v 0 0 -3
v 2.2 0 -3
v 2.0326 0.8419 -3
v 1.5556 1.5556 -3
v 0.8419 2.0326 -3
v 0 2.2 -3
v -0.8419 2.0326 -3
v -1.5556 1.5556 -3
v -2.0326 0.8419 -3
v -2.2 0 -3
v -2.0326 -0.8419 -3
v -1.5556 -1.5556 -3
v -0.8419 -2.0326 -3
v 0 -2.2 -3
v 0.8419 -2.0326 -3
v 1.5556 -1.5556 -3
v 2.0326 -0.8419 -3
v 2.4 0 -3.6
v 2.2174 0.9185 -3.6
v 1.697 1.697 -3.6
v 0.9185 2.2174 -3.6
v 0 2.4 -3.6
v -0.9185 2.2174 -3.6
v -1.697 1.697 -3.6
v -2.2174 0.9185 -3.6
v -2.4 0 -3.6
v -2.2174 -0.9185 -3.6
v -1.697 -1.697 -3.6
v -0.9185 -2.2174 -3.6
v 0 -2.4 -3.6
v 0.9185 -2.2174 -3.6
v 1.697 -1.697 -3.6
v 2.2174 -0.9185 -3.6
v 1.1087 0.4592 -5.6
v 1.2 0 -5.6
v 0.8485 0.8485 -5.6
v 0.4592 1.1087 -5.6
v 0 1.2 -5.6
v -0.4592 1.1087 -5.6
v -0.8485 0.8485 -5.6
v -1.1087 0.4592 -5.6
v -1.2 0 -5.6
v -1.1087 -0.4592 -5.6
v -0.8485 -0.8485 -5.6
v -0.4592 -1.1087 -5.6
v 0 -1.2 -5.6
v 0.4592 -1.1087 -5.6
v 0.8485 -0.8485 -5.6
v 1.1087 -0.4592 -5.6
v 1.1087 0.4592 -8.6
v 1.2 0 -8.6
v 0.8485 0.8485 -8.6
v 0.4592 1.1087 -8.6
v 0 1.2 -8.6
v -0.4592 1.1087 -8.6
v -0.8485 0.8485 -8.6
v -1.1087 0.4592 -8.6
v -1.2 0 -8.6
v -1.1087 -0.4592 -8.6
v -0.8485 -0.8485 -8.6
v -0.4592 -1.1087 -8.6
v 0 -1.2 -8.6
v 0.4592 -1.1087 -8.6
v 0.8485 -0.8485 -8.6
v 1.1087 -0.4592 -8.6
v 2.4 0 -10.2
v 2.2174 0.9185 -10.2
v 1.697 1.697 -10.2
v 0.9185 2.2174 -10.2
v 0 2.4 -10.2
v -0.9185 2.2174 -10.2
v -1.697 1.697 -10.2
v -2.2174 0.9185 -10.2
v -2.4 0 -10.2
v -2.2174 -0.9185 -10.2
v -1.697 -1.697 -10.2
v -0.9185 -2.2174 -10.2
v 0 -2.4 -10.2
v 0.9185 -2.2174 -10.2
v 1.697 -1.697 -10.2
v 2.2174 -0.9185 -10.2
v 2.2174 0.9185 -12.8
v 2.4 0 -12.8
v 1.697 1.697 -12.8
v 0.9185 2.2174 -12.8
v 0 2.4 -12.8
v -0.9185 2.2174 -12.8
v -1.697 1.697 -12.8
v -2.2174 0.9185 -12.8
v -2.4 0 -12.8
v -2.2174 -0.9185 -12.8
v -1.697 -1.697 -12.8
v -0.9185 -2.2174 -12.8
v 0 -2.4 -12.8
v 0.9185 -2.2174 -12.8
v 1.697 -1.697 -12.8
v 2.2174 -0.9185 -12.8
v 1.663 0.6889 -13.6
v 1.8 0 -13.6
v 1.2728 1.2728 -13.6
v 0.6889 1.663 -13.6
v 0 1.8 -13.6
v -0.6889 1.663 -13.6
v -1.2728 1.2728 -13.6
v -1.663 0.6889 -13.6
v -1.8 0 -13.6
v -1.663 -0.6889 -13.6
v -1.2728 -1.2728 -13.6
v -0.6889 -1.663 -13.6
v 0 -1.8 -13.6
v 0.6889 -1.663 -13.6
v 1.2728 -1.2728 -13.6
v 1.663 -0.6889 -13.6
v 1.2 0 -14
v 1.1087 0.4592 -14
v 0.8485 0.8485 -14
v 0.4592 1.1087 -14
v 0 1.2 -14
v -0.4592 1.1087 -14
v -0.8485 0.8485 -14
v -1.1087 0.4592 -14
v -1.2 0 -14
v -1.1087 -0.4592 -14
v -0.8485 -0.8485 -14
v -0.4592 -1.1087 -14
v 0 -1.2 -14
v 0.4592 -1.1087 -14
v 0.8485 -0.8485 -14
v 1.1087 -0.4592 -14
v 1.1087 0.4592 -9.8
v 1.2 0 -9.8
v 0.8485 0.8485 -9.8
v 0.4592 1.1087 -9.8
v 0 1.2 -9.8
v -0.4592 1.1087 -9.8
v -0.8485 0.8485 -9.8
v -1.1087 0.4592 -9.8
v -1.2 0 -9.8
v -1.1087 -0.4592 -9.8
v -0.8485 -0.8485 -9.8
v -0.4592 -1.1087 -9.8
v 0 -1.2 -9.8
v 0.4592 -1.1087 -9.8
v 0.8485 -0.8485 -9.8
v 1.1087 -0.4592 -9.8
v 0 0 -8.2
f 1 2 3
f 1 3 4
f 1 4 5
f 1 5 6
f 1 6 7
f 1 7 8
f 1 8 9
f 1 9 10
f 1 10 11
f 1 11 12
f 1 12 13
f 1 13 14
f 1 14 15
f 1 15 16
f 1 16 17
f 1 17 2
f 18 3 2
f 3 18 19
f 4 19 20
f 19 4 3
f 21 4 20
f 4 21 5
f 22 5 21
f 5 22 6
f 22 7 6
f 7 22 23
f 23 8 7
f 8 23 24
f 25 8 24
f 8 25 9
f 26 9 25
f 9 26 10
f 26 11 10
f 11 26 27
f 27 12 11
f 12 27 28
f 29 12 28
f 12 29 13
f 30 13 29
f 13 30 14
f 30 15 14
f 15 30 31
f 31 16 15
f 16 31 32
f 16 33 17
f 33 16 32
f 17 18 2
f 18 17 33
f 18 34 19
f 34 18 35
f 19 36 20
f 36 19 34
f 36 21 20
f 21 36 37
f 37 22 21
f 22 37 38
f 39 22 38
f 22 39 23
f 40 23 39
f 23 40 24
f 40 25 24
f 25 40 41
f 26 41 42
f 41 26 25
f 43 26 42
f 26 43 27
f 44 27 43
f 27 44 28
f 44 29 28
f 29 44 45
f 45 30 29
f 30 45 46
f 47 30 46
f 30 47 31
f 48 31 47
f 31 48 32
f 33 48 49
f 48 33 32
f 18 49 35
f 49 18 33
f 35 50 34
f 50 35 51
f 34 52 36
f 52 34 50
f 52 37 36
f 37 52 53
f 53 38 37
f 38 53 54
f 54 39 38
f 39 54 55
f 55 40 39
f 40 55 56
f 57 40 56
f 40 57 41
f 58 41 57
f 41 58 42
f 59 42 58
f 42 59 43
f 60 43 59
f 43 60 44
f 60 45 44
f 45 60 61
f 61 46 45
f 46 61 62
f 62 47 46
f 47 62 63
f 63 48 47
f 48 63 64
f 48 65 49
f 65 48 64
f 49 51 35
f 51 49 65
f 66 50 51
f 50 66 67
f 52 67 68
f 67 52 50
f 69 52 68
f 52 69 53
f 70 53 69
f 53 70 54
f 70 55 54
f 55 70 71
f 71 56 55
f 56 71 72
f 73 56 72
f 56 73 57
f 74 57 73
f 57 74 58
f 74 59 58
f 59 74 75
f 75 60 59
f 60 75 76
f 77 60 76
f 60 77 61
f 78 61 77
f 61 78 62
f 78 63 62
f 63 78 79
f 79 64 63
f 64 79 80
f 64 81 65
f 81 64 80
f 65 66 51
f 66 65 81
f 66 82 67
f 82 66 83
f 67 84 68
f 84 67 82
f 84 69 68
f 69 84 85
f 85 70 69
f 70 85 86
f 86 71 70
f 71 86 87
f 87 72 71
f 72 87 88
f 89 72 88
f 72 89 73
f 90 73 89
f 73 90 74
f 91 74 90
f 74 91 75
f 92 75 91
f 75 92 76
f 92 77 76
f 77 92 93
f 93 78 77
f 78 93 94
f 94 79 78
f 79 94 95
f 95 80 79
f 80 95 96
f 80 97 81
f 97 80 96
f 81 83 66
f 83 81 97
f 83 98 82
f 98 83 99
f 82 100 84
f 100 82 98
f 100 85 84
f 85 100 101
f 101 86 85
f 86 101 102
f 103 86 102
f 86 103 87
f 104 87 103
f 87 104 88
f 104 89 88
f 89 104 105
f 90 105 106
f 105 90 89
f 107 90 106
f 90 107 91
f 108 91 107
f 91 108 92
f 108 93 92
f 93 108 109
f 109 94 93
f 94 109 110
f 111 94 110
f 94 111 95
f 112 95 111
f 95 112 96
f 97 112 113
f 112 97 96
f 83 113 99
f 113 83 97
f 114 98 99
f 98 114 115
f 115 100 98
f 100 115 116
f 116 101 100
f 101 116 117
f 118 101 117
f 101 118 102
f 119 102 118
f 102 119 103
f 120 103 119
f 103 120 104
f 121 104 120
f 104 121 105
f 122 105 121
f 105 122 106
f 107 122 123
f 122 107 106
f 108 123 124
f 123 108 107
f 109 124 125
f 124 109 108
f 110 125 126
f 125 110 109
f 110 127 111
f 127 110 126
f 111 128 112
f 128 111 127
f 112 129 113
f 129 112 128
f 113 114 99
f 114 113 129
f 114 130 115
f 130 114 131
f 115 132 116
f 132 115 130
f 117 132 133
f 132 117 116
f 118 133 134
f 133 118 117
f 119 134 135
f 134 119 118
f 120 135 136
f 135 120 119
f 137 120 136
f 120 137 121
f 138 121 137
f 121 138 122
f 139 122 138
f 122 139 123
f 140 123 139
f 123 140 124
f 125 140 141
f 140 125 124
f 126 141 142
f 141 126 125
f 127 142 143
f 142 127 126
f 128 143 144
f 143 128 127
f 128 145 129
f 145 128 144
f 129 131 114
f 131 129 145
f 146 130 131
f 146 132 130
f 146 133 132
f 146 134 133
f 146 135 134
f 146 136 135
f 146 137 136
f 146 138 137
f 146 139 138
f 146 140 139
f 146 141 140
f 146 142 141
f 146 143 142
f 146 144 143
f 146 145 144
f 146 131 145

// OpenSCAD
// file: ../../p/4-4cyli.scad
use <../lib.scad>
$fa=1; $fs=0.2;
function ldraw_lib__4_4cyli(realsolid=false) = [
// 0 Cylinder 1.0
// 0 Name: 4-4cyli.dat
// 0 Author: James Jessiman
// 0 !LDRAW_ORG Primitive UPDATE 2005-01
// 0 !LICENSE Licensed under CC BY 2.0 and CC BY 4.0 : see CAreadme.txt
// 
// 0 BFC CERTIFY CCW
  [0,"BFC","CERTIFY"],
  [0,"BFC","CCW"],
// 
// 0 !HISTORY 1998-12-15 [PTadmin] Official Update 1998-10
// 0 !HISTORY 2002-03-23 [sbliss] Added BFC statement; merged headers from files in distributions LDraw 0.27 and Complete.
// 0 !HISTORY 2002-04-25 [PTadmin] Official Update 2002-02
// 0 !HISTORY 2004-12-14 [guyvivan] BFC CCW
// 0 !HISTORY 2005-12-28 [PTadmin] Official Update 2005-01
// 0 !HISTORY 2007-06-24 [PTadmin] Header formatted for Contributor Agreement
// 0 !HISTORY 2008-07-01 [PTadmin] Official Update 2008-01
// 
// 
// 4 16 1 1 0 0.9239 1 0.3827 0.9239 0 0.3827 1 0 0
  [4,16,1,1,0,0.9239,1,0.3827,0.9239,0,0.3827,1,0,0],
// 5 24 1 0 0 1 1 0 0.9239 0 0.3827 0.9239 0 -0.3827
  [5,24,1,0,0,1,1,0,0.9239,0,0.3827,0.9239,0,-0.3827],
// 4 16 0.9239 1 0.3827 0.7071 1 0.7071 0.7071 0 0.7071 0.9239 0 0.3827
  [4,16,0.9239,1,0.3827,0.7071,1,0.7071,0.7071,0,0.7071,0.9239,0,0.3827],
// 5 24 0.9239 0 0.3827 0.9239 1 0.3827 0.7071 0 0.7071 1 0 0
  [5,24,0.9239,0,0.3827,0.9239,1,0.3827,0.7071,0,0.7071,1,0,0],
// 4 16 0.7071 1 0.7071 0.3827 1 0.9239 0.3827 0 0.9239 0.7071 0 0.7071
  [4,16,0.7071,1,0.7071,0.3827,1,0.9239,0.3827,0,0.9239,0.7071,0,0.7071],
// 5 24 0.7071 0 0.7071 0.7071 1 0.7071 0.3827 0 0.9239 0.9239 0 0.3827
  [5,24,0.7071,0,0.7071,0.7071,1,0.7071,0.3827,0,0.9239,0.9239,0,0.3827],
// 4 16 0.3827 1 0.9239 0 1 1 0 0 1 0.3827 0 0.9239
  [4,16,0.3827,1,0.9239,0,1,1,0,0,1,0.3827,0,0.9239],
// 5 24 0.3827 0 0.9239 0.3827 1 0.9239 0 0 1 0.7071 0 0.7071
  [5,24,0.3827,0,0.9239,0.3827,1,0.9239,0,0,1,0.7071,0,0.7071],
// 4 16 0 1 1 -0.3827 1 0.9239 -0.3827 0 0.9239 0 0 1
  [4,16,0,1,1,-0.3827,1,0.9239,-0.3827,0,0.9239,0,0,1],
// 5 24 0 0 1 0 1 1 -0.3827 0 0.9239 0.3827 0 0.9239
  [5,24,0,0,1,0,1,1,-0.3827,0,0.9239,0.3827,0,0.9239],
// 4 16 -0.3827 1 0.9239 -0.7071 1 0.7071 -0.7071 0 0.7071 -0.3827 0 0.9239
  [4,16,-0.3827,1,0.9239,-0.7071,1,0.7071,-0.7071,0,0.7071,-0.3827,0,0.9239],
// 5 24 -0.3827 0 0.9239 -0.3827 1 0.9239 -0.7071 0 0.7071 0 0 1
  [5,24,-0.3827,0,0.9239,-0.3827,1,0.9239,-0.7071,0,0.7071,0,0,1],
// 4 16 -0.7071 1 0.7071 -0.9239 1 0.3827 -0.9239 0 0.3827 -0.7071 0 0.7071
  [4,16,-0.7071,1,0.7071,-0.9239,1,0.3827,-0.9239,0,0.3827,-0.7071,0,0.7071],
// 5 24 -0.7071 0 0.7071 -0.7071 1 0.7071 -0.9239 0 0.3827 -0.3827 0 0.9239
  [5,24,-0.7071,0,0.7071,-0.7071,1,0.7071,-0.9239,0,0.3827,-0.3827,0,0.9239],
// 4 16 -0.9239 1 0.3827 -1 1 0 -1 0 0 -0.9239 0 0.3827
  [4,16,-0.9239,1,0.3827,-1,1,0,-1,0,0,-0.9239,0,0.3827],
// 5 24 -0.9239 0 0.3827 -0.9239 1 0.3827 -1 0 0 -0.7071 0 0.7071
  [5,24,-0.9239,0,0.3827,-0.9239,1,0.3827,-1,0,0,-0.7071,0,0.7071],
// 4 16 -1 1 0 -0.9239 1 -0.3827 -0.9239 0 -0.3827 -1 0 0
  [4,16,-1,1,0,-0.9239,1,-0.3827,-0.9239,0,-0.3827,-1,0,0],
// 5 24 -1 0 0 -1 1 0 -0.9239 0 -0.3827 -0.9239 0 0.3827
  [5,24,-1,0,0,-1,1,0,-0.9239,0,-0.3827,-0.9239,0,0.3827],
// 4 16 -0.9239 1 -0.3827 -0.7071 1 -0.7071 -0.7071 0 -0.7071 -0.9239 0 -0.3827
  [4,16,-0.9239,1,-0.3827,-0.7071,1,-0.7071,-0.7071,0,-0.7071,-0.9239,0,-0.3827],
// 5 24 -0.9239 0 -0.3827 -0.9239 1 -0.3827 -0.7071 0 -0.7071 -1 0 0
  [5,24,-0.9239,0,-0.3827,-0.9239,1,-0.3827,-0.7071,0,-0.7071,-1,0,0],
// 4 16 -0.7071 1 -0.7071 -0.3827 1 -0.9239 -0.3827 0 -0.9239 -0.7071 0 -0.7071
  [4,16,-0.7071,1,-0.7071,-0.3827,1,-0.9239,-0.3827,0,-0.9239,-0.7071,0,-0.7071],
// 5 24 -0.7071 0 -0.7071 -0.7071 1 -0.7071 -0.3827 0 -0.9239 -0.9239 0 -0.3827
  [5,24,-0.7071,0,-0.7071,-0.7071,1,-0.7071,-0.3827,0,-0.9239,-0.9239,0,-0.3827],
// 4 16 -0.3827 1 -0.9239 0 1 -1 0 0 -1 -0.3827 0 -0.9239
  [4,16,-0.3827,1,-0.9239,0,1,-1,0,0,-1,-0.3827,0,-0.9239],
// 5 24 -0.3827 0 -0.9239 -0.3827 1 -0.9239 0 0 -1 -0.7071 0 -0.7071
  [5,24,-0.3827,0,-0.9239,-0.3827,1,-0.9239,0,0,-1,-0.7071,0,-0.7071],
// 4 16 0 1 -1 0.3827 1 -0.9239 0.3827 0 -0.9239 0 0 -1
  [4,16,0,1,-1,0.3827,1,-0.9239,0.3827,0,-0.9239,0,0,-1],
// 5 24 0 0 -1 0 1 -1 0.3827 0 -0.9239 -0.3827 0 -0.9239
  [5,24,0,0,-1,0,1,-1,0.3827,0,-0.9239,-0.3827,0,-0.9239],
// 4 16 0.3827 1 -0.9239 0.7071 1 -0.7071 0.7071 0 -0.7071 0.3827 0 -0.9239
  [4,16,0.3827,1,-0.9239,0.7071,1,-0.7071,0.7071,0,-0.7071,0.3827,0,-0.9239],
// 5 24 0.3827 0 -0.9239 0.3827 1 -0.9239 0.7071 0 -0.7071 0 0 -1
  [5,24,0.3827,0,-0.9239,0.3827,1,-0.9239,0.7071,0,-0.7071,0,0,-1],
// 4 16 0.7071 1 -0.7071 0.9239 1 -0.3827 0.9239 0 -0.3827 0.7071 0 -0.7071
  [4,16,0.7071,1,-0.7071,0.9239,1,-0.3827,0.9239,0,-0.3827,0.7071,0,-0.7071],
// 5 24 0.7071 0 -0.7071 0.7071 1 -0.7071 0.9239 0 -0.3827 0.3827 0 -0.9239
  [5,24,0.7071,0,-0.7071,0.7071,1,-0.7071,0.9239,0,-0.3827,0.3827,0,-0.9239],
// 4 16 0.9239 1 -0.3827 1 1 0 1 0 0 0.9239 0 -0.3827
  [4,16,0.9239,1,-0.3827,1,1,0,1,0,0,0.9239,0,-0.3827],
// 5 24 0.9239 0 -0.3827 0.9239 1 -0.3827 1 0 0 0.7071 0 -0.7071
  [5,24,0.9239,0,-0.3827,0.9239,1,-0.3827,1,0,0,0.7071,0,-0.7071],
// 0
];
module ldraw_lib__4_4cyli(step=0, col=false, unit=2/5, alt=false, line=0.2, solid=!$preview)
    makepoly(ldraw_lib__4_4cyli(solid), step=step, col=col, unit=unit, alt=alt, line=line, solid=solid);
ldraw_lib__4_4cyli(line=0.2);
// file: ../../p/4-4edge.scad
use <../lib.scad>
function ldraw_lib__4_4edge() = [
// 0 Circle 1.0
// 0 Name: 4-4edge.dat
// 0 Author: James Jessiman
// 0 !LDRAW_ORG Primitive UPDATE 2017-01
// 0 !LICENSE Licensed under CC BY 2.0 and CC BY 4.0 : see CAreadme.txt
// 
// 0 BFC CERTIFY CCW
  [0,"BFC","CERTIFY"],
  [0,"BFC","CCW"],
// 
// 0 !HISTORY 1998-12-15 [PTadmin] Official Update 1998-10
// 0 !HISTORY 2005-12-28 [PTadmin] Official Update 2005-01
// 0 !HISTORY 2007-06-24 [PTadmin] Header formatted for Contributor Agreement
// 0 !HISTORY 2008-07-01 [PTadmin] Official Update 2008-01
// 0 !HISTORY 2017-01-15 [Steffen] BFCed
// 0 !HISTORY 2017-12-30 [PTadmin] Official Update 2017-01
// 
// 
// 2 24 1 0 0 0.9239 0 0.3827
  [2,24,1,0,0,0.9239,0,0.3827],
// 2 24 0.9239 0 0.3827 0.7071 0 0.7071
  [2,24,0.9239,0,0.3827,0.7071,0,0.7071],
// 2 24 0.7071 0 0.7071 0.3827 0 0.9239
  [2,24,0.7071,0,0.7071,0.3827,0,0.9239],
// 2 24 0.3827 0 0.9239 0 0 1
  [2,24,0.3827,0,0.9239,0,0,1],
// 2 24 0 0 1 -0.3827 0 0.9239
  [2,24,0,0,1,-0.3827,0,0.9239],
// 2 24 -0.3827 0 0.9239 -0.7071 0 0.7071
  [2,24,-0.3827,0,0.9239,-0.7071,0,0.7071],
// 2 24 -0.7071 0 0.7071 -0.9239 0 0.3827
  [2,24,-0.7071,0,0.7071,-0.9239,0,0.3827],
// 2 24 -0.9239 0 0.3827 -1 0 -0
  [2,24,-0.9239,0,0.3827,-1,0,-0],
// 2 24 -1 0 -0 -0.9239 0 -0.3827
  [2,24,-1,0,-0,-0.9239,0,-0.3827],
// 2 24 -0.9239 0 -0.3827 -0.7071 0 -0.7071
  [2,24,-0.9239,0,-0.3827,-0.7071,0,-0.7071],
// 2 24 -0.7071 0 -0.7071 -0.3827 0 -0.9239
  [2,24,-0.7071,0,-0.7071,-0.3827,0,-0.9239],
// 2 24 -0.3827 0 -0.9239 0 0 -1
  [2,24,-0.3827,0,-0.9239,0,0,-1],
// 2 24 0 0 -1 0.3827 0 -0.9239
  [2,24,0,0,-1,0.3827,0,-0.9239],
// 2 24 0.3827 0 -0.9239 0.7071 0 -0.7071
  [2,24,0.3827,0,-0.9239,0.7071,0,-0.7071],
// 2 24 0.7071 0 -0.7071 0.9239 0 -0.3827
  [2,24,0.7071,0,-0.7071,0.9239,0,-0.3827],
// 2 24 0.9239 0 -0.3827 1 0 0
  [2,24,0.9239,0,-0.3827,1,0,0],
];
module ldraw_lib__4_4edge(step=0, col=false, unit=2/5, alt=false, line=0.2, solid=!$preview)
    makepoly(ldraw_lib__4_4edge(), step=step, col=col, unit=unit, alt=alt, line=line, solid=solid);
ldraw_lib__4_4edge(line=0.2);
// file: ../../p/4-4disc.scad
use <../lib.scad>
function ldraw_lib__4_4disc() = [
// 0 Disc 1.0
// 0 Name: 4-4disc.dat
// 0 Author: James Jessiman
// 0 !LDRAW_ORG Primitive UPDATE 2002-02
// 0 !LICENSE Licensed under CC BY 2.0 and CC BY 4.0 : see CAreadme.txt
// 
// 0 BFC CERTIFY CCW
  [0,"BFC","CERTIFY"],
  [0,"BFC","CCW"],
// 
// 0 !HISTORY 1998-12-15 [PTadmin] Official Update 1998-10
// 0 !HISTORY 2002-03-23 [sbliss] Added BFC statement
// 0 !HISTORY 2002-04-25 [PTadmin] Official Update 2002-02
// 0 !HISTORY 2007-06-24 [PTadmin] Header formatted for Contributor Agreement
// 0 !HISTORY 2008-07-01 [PTadmin] Official Update 2008-01
// 
// 
// 3 16 0 0 0 1 0 0 0.9239 0 0.3827
  [3,16,0,0,0,1,0,0,0.9239,0,0.3827],
// 3 16 0 0 0 0.9239 0 0.3827 0.7071 0 0.7071
  [3,16,0,0,0,0.9239,0,0.3827,0.7071,0,0.7071],
// 3 16 0 0 0 0.7071 0 0.7071 0.3827 0 0.9239
  [3,16,0,0,0,0.7071,0,0.7071,0.3827,0,0.9239],
// 3 16 0 0 0 0.3827 0 0.9239 0 0 1
  [3,16,0,0,0,0.3827,0,0.9239,0,0,1],
// 3 16 0 0 0 0 0 1 -0.3827 0 0.9239
  [3,16,0,0,0,0,0,1,-0.3827,0,0.9239],
// 3 16 0 0 0 -0.3827 0 0.9239 -0.7071 0 0.7071
  [3,16,0,0,0,-0.3827,0,0.9239,-0.7071,0,0.7071],
// 3 16 0 0 0 -0.7071 0 0.7071 -0.9239 0 0.3827
  [3,16,0,0,0,-0.7071,0,0.7071,-0.9239,0,0.3827],
// 3 16 0 0 0 -0.9239 0 0.3827 -1 0 -0
  [3,16,0,0,0,-0.9239,0,0.3827,-1,0,-0],
// 3 16 0 0 0 -1 0 -0 -0.9239 0 -0.3827
  [3,16,0,0,0,-1,0,-0,-0.9239,0,-0.3827],
// 3 16 0 0 0 -0.9239 0 -0.3827 -0.7071 0 -0.7071
  [3,16,0,0,0,-0.9239,0,-0.3827,-0.7071,0,-0.7071],
// 3 16 0 0 0 -0.7071 0 -0.7071 -0.3827 0 -0.9239
  [3,16,0,0,0,-0.7071,0,-0.7071,-0.3827,0,-0.9239],
// 3 16 0 0 0 -0.3827 0 -0.9239 0 0 -1
  [3,16,0,0,0,-0.3827,0,-0.9239,0,0,-1],
// 3 16 0 0 0 0 0 -1 0.3827 0 -0.9239
  [3,16,0,0,0,0,0,-1,0.3827,0,-0.9239],
// 3 16 0 0 0 0.3827 0 -0.9239 0.7071 0 -0.7071
  [3,16,0,0,0,0.3827,0,-0.9239,0.7071,0,-0.7071],
// 3 16 0 0 0 0.7071 0 -0.7071 0.9239 0 -0.3827
  [3,16,0,0,0,0.7071,0,-0.7071,0.9239,0,-0.3827],
// 3 16 0 0 0 0.9239 0 -0.3827 1 0 0
  [3,16,0,0,0,0.9239,0,-0.3827,1,0,0],
// 0
];
module ldraw_lib__4_4disc(step=0, col=false, unit=2/5, alt=false, line=0.2, solid=!$preview)
    makepoly(ldraw_lib__4_4disc(), step=step, col=col, unit=unit, alt=alt, line=line, solid=solid);
ldraw_lib__4_4disc(line=0.2);
// file: ../../p/4-4cylo.scad
use <../lib.scad>
use <4-4cyli.scad>
use <4-4edge.scad>
function ldraw_lib__4_4cylo() = [
// 0 Cylinder Open 1.0
// 0 Name: 4-4cylo.dat
// 0 Author: Mark Kennedy [mkennedy]
// 0 !LDRAW_ORG Primitive UPDATE 2010-01
// 0 !LICENSE Licensed under CC BY 2.0 and CC BY 4.0 : see CAreadme.txt
// 
// 0 BFC CERTIFY CCW
  [0,"BFC","CERTIFY"],
  [0,"BFC","CCW"],
// 
// 0 !HISTORY 2010-04-05 [PTadmin] Official Update 2010-01
// 
// 
// 1 16 0 0 0 1 0 0 0 1 0 0 0 1 4-4edge.dat
  [1,16,0,0,0,1,0,0,0,1,0,0,0,1, ldraw_lib__4_4edge()],
// 1 16 0 1 0 1 0 0 0 1 0 0 0 1 4-4edge.dat
  [1,16,0,1,0,1,0,0,0,1,0,0,0,1, ldraw_lib__4_4edge()],
// 1 16 0 0 0 1 0 0 0 1 0 0 0 1 4-4cyli.dat
  [1,16,0,0,0,1,0,0,0,1,0,0,0,1, ldraw_lib__4_4cyli()],
// 0
];
makepoly(ldraw_lib__4_4cylo(), line=0.2);
// file: ../../p/4-4con3.scad
use <../lib.scad>
function ldraw_lib__4_4con3() = [
// 0 Cone  3 x 1.0
// 0 Name: 4-4con3.dat
// 0 Author: Niels Karsdorp [nielsk]
// 0 !LDRAW_ORG Primitive UPDATE 2003-02
// 0 !LICENSE Licensed under CC BY 4.0 : see CAreadme.txt
// 
// 0 BFC CERTIFY CCW
  [0,"BFC","CERTIFY"],
  [0,"BFC","CCW"],
// 
// 0 !HISTORY 2003-08-01 [PTadmin] Official Update 2003-02
// 0 !HISTORY 2007-06-24 [PTadmin] Header formatted for Contributor Agreement
// 0 !HISTORY 2008-07-01 [PTadmin] Official Update 2008-01
// 
// 
// 5 24 3 1 0 4 0 0 2.7717 1 1.1481 2.7717 1 -1.1481
  [5,24,3,1,0,4,0,0,2.7717,1,1.1481,2.7717,1,-1.1481],
// 5 24 2.7717 1 1.1481 3.6956 0 1.5308 2.1213 1 2.1213 3 1 0
  [5,24,2.7717,1,1.1481,3.6956,0,1.5308,2.1213,1,2.1213,3,1,0],
// 5 24 2.1213 1 2.1213 2.8284 0 2.8284 1.1481 1 2.7717 2.7717 1 1.1481
  [5,24,2.1213,1,2.1213,2.8284,0,2.8284,1.1481,1,2.7717,2.7717,1,1.1481],
// 5 24 1.1481 1 2.7717 1.5308 0 3.6956 0 1 3 2.1213 1 2.1213
  [5,24,1.1481,1,2.7717,1.5308,0,3.6956,0,1,3,2.1213,1,2.1213],
// 5 24 0 1 3 0 0 4 -1.1481 1 2.7717 1.1481 1 2.7717
  [5,24,0,1,3,0,0,4,-1.1481,1,2.7717,1.1481,1,2.7717],
// 5 24 -1.1481 1 2.7717 -1.5308 0 3.6956 -2.1213 1 2.1213 0 1 3
  [5,24,-1.1481,1,2.7717,-1.5308,0,3.6956,-2.1213,1,2.1213,0,1,3],
// 5 24 -2.1213 1 2.1213 -2.8284 0 2.8284 -2.7717 1 1.1481 -1.1481 1 2.7717
  [5,24,-2.1213,1,2.1213,-2.8284,0,2.8284,-2.7717,1,1.1481,-1.1481,1,2.7717],
// 5 24 -2.7717 1 1.1481 -3.6956 0 1.5308 -3 1 0 -2.1213 1 2.1213
  [5,24,-2.7717,1,1.1481,-3.6956,0,1.5308,-3,1,0,-2.1213,1,2.1213],
// 5 24 -3 1 0 -4 0 0 -2.7717 1 -1.1481 -2.7717 1 1.1481
  [5,24,-3,1,0,-4,0,0,-2.7717,1,-1.1481,-2.7717,1,1.1481],
// 5 24 -2.7717 1 -1.1481 -3.6956 0 -1.5308 -2.1213 1 -2.1213 -3 1 0
  [5,24,-2.7717,1,-1.1481,-3.6956,0,-1.5308,-2.1213,1,-2.1213,-3,1,0],
// 5 24 -2.1213 1 -2.1213 -2.8284 0 -2.8284 -1.1481 1 -2.7717 -2.7717 1 -1.1481
  [5,24,-2.1213,1,-2.1213,-2.8284,0,-2.8284,-1.1481,1,-2.7717,-2.7717,1,-1.1481],
// 5 24 -1.1481 1 -2.7717 -1.5308 0 -3.6956 0 1 -3 -2.1213 1 -2.1213
  [5,24,-1.1481,1,-2.7717,-1.5308,0,-3.6956,0,1,-3,-2.1213,1,-2.1213],
// 5 24 0 1 -3 0 0 -4 1.1481 1 -2.7717 -1.1481 1 -2.7717
  [5,24,0,1,-3,0,0,-4,1.1481,1,-2.7717,-1.1481,1,-2.7717],
// 5 24 1.1481 1 -2.7717 1.5308 0 -3.6956 2.1213 1 -2.1213 0 1 -3
  [5,24,1.1481,1,-2.7717,1.5308,0,-3.6956,2.1213,1,-2.1213,0,1,-3],
// 5 24 2.1213 1 -2.1213 2.8284 0 -2.8284 2.7717 1 -1.1481 1.1481 1 -2.7717
  [5,24,2.1213,1,-2.1213,2.8284,0,-2.8284,2.7717,1,-1.1481,1.1481,1,-2.7717],
// 5 24 2.7717 1 -1.1481 3.6956 0 -1.5308 3 1 0 2.1213 1 -2.1213
  [5,24,2.7717,1,-1.1481,3.6956,0,-1.5308,3,1,0,2.1213,1,-2.1213],
// 
// 4 16 3 1 0 2.7717 1 1.1481 3.6956 0 1.5308 4 0 0
  [4,16,3,1,0,2.7717,1,1.1481,3.6956,0,1.5308,4,0,0],
// 4 16 2.7717 1 1.1481 2.1213 1 2.1213 2.8284 0 2.8284 3.6956 0 1.5308
  [4,16,2.7717,1,1.1481,2.1213,1,2.1213,2.8284,0,2.8284,3.6956,0,1.5308],
// 4 16 2.1213 1 2.1213 1.1481 1 2.7717 1.5308 0 3.6956 2.8284 0 2.8284
  [4,16,2.1213,1,2.1213,1.1481,1,2.7717,1.5308,0,3.6956,2.8284,0,2.8284],
// 4 16 1.1481 1 2.7717 0 1 3 0 0 4 1.5308 0 3.6956
  [4,16,1.1481,1,2.7717,0,1,3,0,0,4,1.5308,0,3.6956],
// 4 16 0 1 3 -1.1481 1 2.7717 -1.5308 0 3.6956 0 0 4
  [4,16,0,1,3,-1.1481,1,2.7717,-1.5308,0,3.6956,0,0,4],
// 4 16 -1.1481 1 2.7717 -2.1213 1 2.1213 -2.8284 0 2.8284 -1.5308 0 3.6956
  [4,16,-1.1481,1,2.7717,-2.1213,1,2.1213,-2.8284,0,2.8284,-1.5308,0,3.6956],
// 4 16 -2.1213 1 2.1213 -2.7717 1 1.1481 -3.6956 0 1.5308 -2.8284 0 2.8284
  [4,16,-2.1213,1,2.1213,-2.7717,1,1.1481,-3.6956,0,1.5308,-2.8284,0,2.8284],
// 4 16 -2.7717 1 1.1481 -3 1 0 -4 0 0 -3.6956 0 1.5308
  [4,16,-2.7717,1,1.1481,-3,1,0,-4,0,0,-3.6956,0,1.5308],
// 4 16 -3 1 0 -2.7717 1 -1.1481 -3.6956 0 -1.5308 -4 0 0
  [4,16,-3,1,0,-2.7717,1,-1.1481,-3.6956,0,-1.5308,-4,0,0],
// 4 16 -2.7717 1 -1.1481 -2.1213 1 -2.1213 -2.8284 0 -2.8284 -3.6956 0 -1.5308
  [4,16,-2.7717,1,-1.1481,-2.1213,1,-2.1213,-2.8284,0,-2.8284,-3.6956,0,-1.5308],
// 4 16 -2.1213 1 -2.1213 -1.1481 1 -2.7717 -1.5308 0 -3.6956 -2.8284 0 -2.8284
  [4,16,-2.1213,1,-2.1213,-1.1481,1,-2.7717,-1.5308,0,-3.6956,-2.8284,0,-2.8284],
// 4 16 -1.1481 1 -2.7717 0 1 -3 0 0 -4 -1.5308 0 -3.6956
  [4,16,-1.1481,1,-2.7717,0,1,-3,0,0,-4,-1.5308,0,-3.6956],
// 4 16 0 1 -3 1.1481 1 -2.7717 1.5308 0 -3.6956 0 0 -4
  [4,16,0,1,-3,1.1481,1,-2.7717,1.5308,0,-3.6956,0,0,-4],
// 4 16 1.1481 1 -2.7717 2.1213 1 -2.1213 2.8284 0 -2.8284 1.5308 0 -3.6956
  [4,16,1.1481,1,-2.7717,2.1213,1,-2.1213,2.8284,0,-2.8284,1.5308,0,-3.6956],
// 4 16 2.1213 1 -2.1213 2.7717 1 -1.1481 3.6956 0 -1.5308 2.8284 0 -2.8284
  [4,16,2.1213,1,-2.1213,2.7717,1,-1.1481,3.6956,0,-1.5308,2.8284,0,-2.8284],
// 4 16 2.7717 1 -1.1481 3 1 0 4 0 0 3.6956 0 -1.5308
  [4,16,2.7717,1,-1.1481,3,1,0,4,0,0,3.6956,0,-1.5308],
// 
// 0
// 
];
module ldraw_lib__4_4con3(step=0, col=false, unit=2/5, alt=false, line=0.2, solid=!$preview)
    makepoly(ldraw_lib__4_4con3(), step=step, col=col, unit=unit, alt=alt, line=line, solid=solid);
ldraw_lib__4_4con3(line=0.2);
// file: ../../p/4-4con2.scad
use <../lib.scad>
function ldraw_lib__4_4con2() = [
// 0 Cone  2 x 1.0
// 0 Name: 4-4con2.dat
// 0 Author: John Riley [jriley]
// 0 !LDRAW_ORG Primitive UPDATE 2012-01
// 0 !LICENSE Licensed under CC BY 2.0 and CC BY 4.0 : see CAreadme.txt
// 
// 0 BFC CERTIFY CCW
  [0,"BFC","CERTIFY"],
  [0,"BFC","CCW"],
// 
// 0 !HISTORY 2004-03-02 [PTadmin] Official Update 2004-01
// 0 !HISTORY 2007-06-24 [PTadmin] Header formatted for Contributor Agreement
// 0 !HISTORY 2008-07-01 [PTadmin] Official Update 2008-01
// 0 !HISTORY 2012-02-16 [Philo] Changed to CCW
// 0 !HISTORY 2012-03-30 [PTadmin] Official Update 2012-01
// 
// 
// 4 16 1.8478 1 0.7654 2.7717 0 1.1481 3 0 0 2 1 0
  [4,16,1.8478,1,0.7654,2.7717,0,1.1481,3,0,0,2,1,0],
// 4 16 1.4142 1 1.4142 2.1213 0 2.1213 2.7717 0 1.1481 1.8478 1 0.7654
  [4,16,1.4142,1,1.4142,2.1213,0,2.1213,2.7717,0,1.1481,1.8478,1,0.7654],
// 4 16 0.7654 1 1.8478 1.1481 0 2.7717 2.1213 0 2.1213 1.4142 1 1.4142
  [4,16,0.7654,1,1.8478,1.1481,0,2.7717,2.1213,0,2.1213,1.4142,1,1.4142],
// 4 16 0 1 2 0 0 3 1.1481 0 2.7717 0.7654 1 1.8478
  [4,16,0,1,2,0,0,3,1.1481,0,2.7717,0.7654,1,1.8478],
// 4 16 -0.7654 1 1.8478 -1.1481 0 2.7717 0 0 3 0 1 2
  [4,16,-0.7654,1,1.8478,-1.1481,0,2.7717,0,0,3,0,1,2],
// 4 16 -1.4142 1 1.4142 -2.1213 0 2.1213 -1.1481 0 2.7717 -0.7654 1 1.8478
  [4,16,-1.4142,1,1.4142,-2.1213,0,2.1213,-1.1481,0,2.7717,-0.7654,1,1.8478],
// 4 16 -1.8478 1 0.7654 -2.7717 0 1.1481 -2.1213 0 2.1213 -1.4142 1 1.4142
  [4,16,-1.8478,1,0.7654,-2.7717,0,1.1481,-2.1213,0,2.1213,-1.4142,1,1.4142],
// 4 16 -2 1 0 -3 0 0 -2.7717 0 1.1481 -1.8478 1 0.7654
  [4,16,-2,1,0,-3,0,0,-2.7717,0,1.1481,-1.8478,1,0.7654],
// 4 16 -1.8478 1 -0.7654 -2.7717 0 -1.1481 -3 0 0 -2 1 0
  [4,16,-1.8478,1,-0.7654,-2.7717,0,-1.1481,-3,0,0,-2,1,0],
// 4 16 -1.4142 1 -1.4142 -2.1213 0 -2.1213 -2.7717 0 -1.1481 -1.8478 1 -0.7654
  [4,16,-1.4142,1,-1.4142,-2.1213,0,-2.1213,-2.7717,0,-1.1481,-1.8478,1,-0.7654],
// 4 16 -0.7654 1 -1.8478 -1.1481 0 -2.7717 -2.1213 0 -2.1213 -1.4142 1 -1.4142
  [4,16,-0.7654,1,-1.8478,-1.1481,0,-2.7717,-2.1213,0,-2.1213,-1.4142,1,-1.4142],
// 4 16 0 1 -2 0 0 -3 -1.1481 0 -2.7717 -0.7654 1 -1.8478
  [4,16,0,1,-2,0,0,-3,-1.1481,0,-2.7717,-0.7654,1,-1.8478],
// 4 16 0.7654 1 -1.8478 1.1481 0 -2.7717 0 0 -3 0 1 -2
  [4,16,0.7654,1,-1.8478,1.1481,0,-2.7717,0,0,-3,0,1,-2],
// 4 16 1.4142 1 -1.4142 2.1213 0 -2.1213 1.1481 0 -2.7717 0.7654 1 -1.8478
  [4,16,1.4142,1,-1.4142,2.1213,0,-2.1213,1.1481,0,-2.7717,0.7654,1,-1.8478],
// 4 16 1.8478 1 -0.7654 2.7717 0 -1.1481 2.1213 0 -2.1213 1.4142 1 -1.4142
  [4,16,1.8478,1,-0.7654,2.7717,0,-1.1481,2.1213,0,-2.1213,1.4142,1,-1.4142],
// 4 16 2 1 0 3 0 0 2.7717 0 -1.1481 1.8478 1 -0.7654
  [4,16,2,1,0,3,0,0,2.7717,0,-1.1481,1.8478,1,-0.7654],
// 
// 5 24 2 1 0 3 0 0 1.8478 1 -0.7654 1.8478 1 0.7654
  [5,24,2,1,0,3,0,0,1.8478,1,-0.7654,1.8478,1,0.7654],
// 5 24 1.8478 1 0.7654 2.7717 0 1.1481 2 1 0 1.4142 1 1.4142
  [5,24,1.8478,1,0.7654,2.7717,0,1.1481,2,1,0,1.4142,1,1.4142],
// 5 24 1.4142 1 1.4142 2.1213 0 2.1213 1.8478 1 0.7654 0.7654 1 1.8478
  [5,24,1.4142,1,1.4142,2.1213,0,2.1213,1.8478,1,0.7654,0.7654,1,1.8478],
// 5 24 0.7654 1 1.8478 1.1481 0 2.7717 1.4142 1 1.4142 0 1 2
  [5,24,0.7654,1,1.8478,1.1481,0,2.7717,1.4142,1,1.4142,0,1,2],
// 5 24 0 1 2 0 0 3 0.7654 1 1.8478 -0.7654 1 1.8478
  [5,24,0,1,2,0,0,3,0.7654,1,1.8478,-0.7654,1,1.8478],
// 5 24 -0.7654 1 1.8478 -1.1481 0 2.7717 0 1 2 -1.4142 1 1.4142
  [5,24,-0.7654,1,1.8478,-1.1481,0,2.7717,0,1,2,-1.4142,1,1.4142],
// 5 24 -1.4142 1 1.4142 -2.1213 0 2.1213 -0.7654 1 1.8478 -1.8478 1 0.7654
  [5,24,-1.4142,1,1.4142,-2.1213,0,2.1213,-0.7654,1,1.8478,-1.8478,1,0.7654],
// 5 24 -1.8478 1 0.7654 -2.7717 0 1.1481 -1.4142 1 1.4142 -2 1 0
  [5,24,-1.8478,1,0.7654,-2.7717,0,1.1481,-1.4142,1,1.4142,-2,1,0],
// 5 24 -2 1 0 -3 0 0 -1.8478 1 0.7654 -1.8478 1 -0.7654
  [5,24,-2,1,0,-3,0,0,-1.8478,1,0.7654,-1.8478,1,-0.7654],
// 5 24 -1.8478 1 -0.7654 -2.7717 0 -1.1481 -2 1 0 -1.4142 1 -1.4142
  [5,24,-1.8478,1,-0.7654,-2.7717,0,-1.1481,-2,1,0,-1.4142,1,-1.4142],
// 5 24 -1.4142 1 -1.4142 -2.1213 0 -2.1213 -1.8478 1 -0.7654 -0.7654 1 -1.8478
  [5,24,-1.4142,1,-1.4142,-2.1213,0,-2.1213,-1.8478,1,-0.7654,-0.7654,1,-1.8478],
// 5 24 -0.7654 1 -1.8478 -1.1481 0 -2.7717 -1.4142 1 -1.4142 0 1 -2
  [5,24,-0.7654,1,-1.8478,-1.1481,0,-2.7717,-1.4142,1,-1.4142,0,1,-2],
// 5 24 0 1 -2 0 0 -3 -0.7654 1 -1.8478 0.7654 1 -1.8478
  [5,24,0,1,-2,0,0,-3,-0.7654,1,-1.8478,0.7654,1,-1.8478],
// 5 24 0.7654 1 -1.8478 1.1481 0 -2.7717 0 1 -2 1.4142 1 -1.4142
  [5,24,0.7654,1,-1.8478,1.1481,0,-2.7717,0,1,-2,1.4142,1,-1.4142],
// 5 24 1.4142 1 -1.4142 2.1213 0 -2.1213 0.7654 1 -1.8478 1.8478 1 -0.7654
  [5,24,1.4142,1,-1.4142,2.1213,0,-2.1213,0.7654,1,-1.8478,1.8478,1,-0.7654],
// 5 24 1.8478 1 -0.7654 2.7717 0 -1.1481 1.4142 1 -1.4142 2 1 0
  [5,24,1.8478,1,-0.7654,2.7717,0,-1.1481,1.4142,1,-1.4142,2,1,0],
];
module ldraw_lib__4_4con2(step=0, col=false, unit=2/5, alt=false, line=0.2, solid=!$preview)
    makepoly(ldraw_lib__4_4con2(), step=step, col=col, unit=unit, alt=alt, line=line, solid=solid);
ldraw_lib__4_4con2(line=0.2);
// file: ../../p/4-4con11.scad
use <../lib.scad>
$fa=1; $fs=0.2;
function ldraw_lib__4_4con11(realsolid=false) = [
// 0 Cone 11 x 1.0
// 0 Name: 4-4con11.dat
// 0 Author: John Riley [jriley]
// 0 !LDRAW_ORG Primitive UPDATE 2012-01
// 0 !LICENSE Licensed under CC BY 2.0 and CC BY 4.0 : see CAreadme.txt
// 
// 0 BFC CERTIFY CCW
  [0,"BFC","CERTIFY"],
  [0,"BFC","CCW"],
// 
// 0 !HISTORY 2009-12-29 [PTadmin] Official Update 2009-03
// 0 !HISTORY 2012-02-16 [Philo] Changed to CCW
// 0 !HISTORY 2012-03-30 [PTadmin] Official Update 2012-01
// 
// 
// 4 16 10.1629 1 4.2097 11.0868 0 4.5924 12 0 0 11 1 0
  [4,16,10.1629,1,4.2097,11.0868,0,4.5924,12,0,0,11,1,0],
// 4 16 7.7781 1 7.7781 8.4852 0 8.4852 11.0868 0 4.5924 10.1629 1 4.2097
  [4,16,7.7781,1,7.7781,8.4852,0,8.4852,11.0868,0,4.5924,10.1629,1,4.2097],
// 4 16 4.2097 1 10.1629 4.5924 0 11.0868 8.4852 0 8.4852 7.7781 1 7.7781
  [4,16,4.2097,1,10.1629,4.5924,0,11.0868,8.4852,0,8.4852,7.7781,1,7.7781],
// 4 16 0 1 11 0 0 12 4.5924 0 11.0868 4.2097 1 10.1629
  [4,16,0,1,11,0,0,12,4.5924,0,11.0868,4.2097,1,10.1629],
// 4 16 -4.2097 1 10.1629 -4.5924 0 11.0868 0 0 12 0 1 11
  [4,16,-4.2097,1,10.1629,-4.5924,0,11.0868,0,0,12,0,1,11],
// 4 16 -7.7781 1 7.7781 -8.4852 0 8.4852 -4.5924 0 11.0868 -4.2097 1 10.1629
  [4,16,-7.7781,1,7.7781,-8.4852,0,8.4852,-4.5924,0,11.0868,-4.2097,1,10.1629],
// 4 16 -10.1629 1 4.2097 -11.0868 0 4.5924 -8.4852 0 8.4852 -7.7781 1 7.7781
  [4,16,-10.1629,1,4.2097,-11.0868,0,4.5924,-8.4852,0,8.4852,-7.7781,1,7.7781],
// 4 16 -11 1 0 -12 0 0 -11.0868 0 4.5924 -10.1629 1 4.2097
  [4,16,-11,1,0,-12,0,0,-11.0868,0,4.5924,-10.1629,1,4.2097],
// 4 16 -10.1629 1 -4.2097 -11.0868 0 -4.5924 -12 0 0 -11 1 0
  [4,16,-10.1629,1,-4.2097,-11.0868,0,-4.5924,-12,0,0,-11,1,0],
// 4 16 -7.7781 1 -7.7781 -8.4852 0 -8.4852 -11.0868 0 -4.5924 -10.1629 1 -4.2097
  [4,16,-7.7781,1,-7.7781,-8.4852,0,-8.4852,-11.0868,0,-4.5924,-10.1629,1,-4.2097],
// 4 16 -4.2097 1 -10.1629 -4.5924 0 -11.0868 -8.4852 0 -8.4852 -7.7781 1 -7.7781
  [4,16,-4.2097,1,-10.1629,-4.5924,0,-11.0868,-8.4852,0,-8.4852,-7.7781,1,-7.7781],
// 4 16 0 1 -11 0 0 -12 -4.5924 0 -11.0868 -4.2097 1 -10.1629
  [4,16,0,1,-11,0,0,-12,-4.5924,0,-11.0868,-4.2097,1,-10.1629],
// 4 16 4.2097 1 -10.1629 4.5924 0 -11.0868 0 0 -12 0 1 -11
  [4,16,4.2097,1,-10.1629,4.5924,0,-11.0868,0,0,-12,0,1,-11],
// 4 16 7.7781 1 -7.7781 8.4852 0 -8.4852 4.5924 0 -11.0868 4.2097 1 -10.1629
  [4,16,7.7781,1,-7.7781,8.4852,0,-8.4852,4.5924,0,-11.0868,4.2097,1,-10.1629],
// 4 16 10.1629 1 -4.2097 11.0868 0 -4.5924 8.4852 0 -8.4852 7.7781 1 -7.7781
  [4,16,10.1629,1,-4.2097,11.0868,0,-4.5924,8.4852,0,-8.4852,7.7781,1,-7.7781],
// 4 16 11 1 0 12 0 0 11.0868 0 -4.5924 10.1629 1 -4.2097
  [4,16,11,1,0,12,0,0,11.0868,0,-4.5924,10.1629,1,-4.2097],
// 
// 5 24 11 1 0 12 0 0 10.1629 1 4.2097 10.1629 1 -4.2097
  [5,24,11,1,0,12,0,0,10.1629,1,4.2097,10.1629,1,-4.2097],
// 5 24 10.1629 1 4.2097 11.0868 0 4.5924 7.7781 1 7.7781 11 1 0
  [5,24,10.1629,1,4.2097,11.0868,0,4.5924,7.7781,1,7.7781,11,1,0],
// 5 24 7.7781 1 7.7781 8.4852 0 8.4852 4.2097 1 10.1629 10.1629 1 4.2097
  [5,24,7.7781,1,7.7781,8.4852,0,8.4852,4.2097,1,10.1629,10.1629,1,4.2097],
// 5 24 4.2097 1 10.1629 4.5924 0 11.0868 0 1 11 7.7781 1 7.7781
  [5,24,4.2097,1,10.1629,4.5924,0,11.0868,0,1,11,7.7781,1,7.7781],
// 5 24 0 1 11 0 0 12 -4.2097 1 10.1629 4.2097 1 10.1629
  [5,24,0,1,11,0,0,12,-4.2097,1,10.1629,4.2097,1,10.1629],
// 5 24 -4.2097 1 10.1629 -4.5924 0 11.0868 -7.7781 1 7.7781 0 1 11
  [5,24,-4.2097,1,10.1629,-4.5924,0,11.0868,-7.7781,1,7.7781,0,1,11],
// 5 24 -7.7781 1 7.7781 -8.4852 0 8.4852 -10.1629 1 4.2097 -4.2097 1 10.1629
  [5,24,-7.7781,1,7.7781,-8.4852,0,8.4852,-10.1629,1,4.2097,-4.2097,1,10.1629],
// 5 24 -10.1629 1 4.2097 -11.0868 0 4.5924 -11 1 0 -7.7781 1 7.7781
  [5,24,-10.1629,1,4.2097,-11.0868,0,4.5924,-11,1,0,-7.7781,1,7.7781],
// 5 24 -11 1 0 -12 0 0 -10.1629 1 -4.2097 -10.1629 1 4.2097
  [5,24,-11,1,0,-12,0,0,-10.1629,1,-4.2097,-10.1629,1,4.2097],
// 5 24 -10.1629 1 -4.2097 -11.0868 0 -4.5924 -7.7781 1 -7.7781 -11 1 0
  [5,24,-10.1629,1,-4.2097,-11.0868,0,-4.5924,-7.7781,1,-7.7781,-11,1,0],
// 5 24 -7.7781 1 -7.7781 -8.4852 0 -8.4852 -4.2097 1 -10.1629 -10.1629 1 -4.2097
  [5,24,-7.7781,1,-7.7781,-8.4852,0,-8.4852,-4.2097,1,-10.1629,-10.1629,1,-4.2097],
// 5 24 -4.2097 1 -10.1629 -4.5924 0 -11.0868 0 1 -11 -7.7781 1 -7.7781
  [5,24,-4.2097,1,-10.1629,-4.5924,0,-11.0868,0,1,-11,-7.7781,1,-7.7781],
// 5 24 0 1 -11 0 0 -12 4.2097 1 -10.1629 -4.2097 1 -10.1629
  [5,24,0,1,-11,0,0,-12,4.2097,1,-10.1629,-4.2097,1,-10.1629],
// 5 24 4.2097 1 -10.1629 4.5924 0 -11.0868 7.7781 1 -7.7781 0 1 -11
  [5,24,4.2097,1,-10.1629,4.5924,0,-11.0868,7.7781,1,-7.7781,0,1,-11],
// 5 24 7.7781 1 -7.7781 8.4852 0 -8.4852 10.1629 1 -4.2097 4.2097 1 -10.1629
  [5,24,7.7781,1,-7.7781,8.4852,0,-8.4852,10.1629,1,-4.2097,4.2097,1,-10.1629],
// 5 24 10.1629 1 -4.2097 11.0868 0 -4.5924 11 1 0 7.7781 1 -7.7781
  [5,24,10.1629,1,-4.2097,11.0868,0,-4.5924,11,1,0,7.7781,1,-7.7781],
];
module ldraw_lib__4_4con11(step=0, col=false, unit=2/5, alt=false, line=0.2, solid=!$preview)
    makepoly(ldraw_lib__4_4con11(solid), step=step, col=col, unit=unit, alt=alt, line=line, solid=solid);
ldraw_lib__4_4con11(line=0.2);
// file: ../../p/4-4con1.scad
use <../lib.scad>
function ldraw_lib__4_4con1() = [
// 0 Cone  1 x 1.0
// 0 Name: 4-4con1.dat
// 0 Author: Steve Bliss [sbliss]
// 0 !LDRAW_ORG Primitive UPDATE 2012-01
// 0 !LICENSE Licensed under CC BY 4.0 : see CAreadme.txt
// 
// 0 BFC CERTIFY CCW
  [0,"BFC","CERTIFY"],
  [0,"BFC","CCW"],
// 
// 0 !HISTORY 1999-08-19 [sbliss] Renamed 4-4con12.dat to 4-4con1.dat, Moved all conditional lines before quads
// 0 !HISTORY 2000-05-07 [PTadmin] Official Update 2000-01
// 0 !HISTORY 2002-12-11 [cwdee] Standardised title and made BFC compliant
// 0 !HISTORY 2003-08-01 [PTadmin] Official Update 2003-02
// 0 !HISTORY 2007-06-24 [PTadmin] Header formatted for Contributor Agreement
// 0 !HISTORY 2008-07-01 [PTadmin] Official Update 2008-01
// 0 !HISTORY 2012-02-16 [Philo] Changed to CCW, reordered
// 0 !HISTORY 2012-03-30 [PTadmin] Official Update 2012-01
// 
// 
// 5 24 1 1 0 2 0 0 0.9239 1 -0.3827 0.9239 1 0.3827
  [5,24,1,1,0,2,0,0,0.9239,1,-0.3827,0.9239,1,0.3827],
// 5 24 0.9239 1 0.3827 1.8478 0 0.7654 1 1 0 0.7071 1 0.7071
  [5,24,0.9239,1,0.3827,1.8478,0,0.7654,1,1,0,0.7071,1,0.7071],
// 5 24 0.7071 1 0.7071 1.4142 0 1.4142 0.9239 1 0.3827 0.3827 1 0.9239
  [5,24,0.7071,1,0.7071,1.4142,0,1.4142,0.9239,1,0.3827,0.3827,1,0.9239],
// 5 24 0.3827 1 0.9239 0.7654 0 1.8478 0.7071 1 0.7071 0 1 1
  [5,24,0.3827,1,0.9239,0.7654,0,1.8478,0.7071,1,0.7071,0,1,1],
// 5 24 0 1 1 0 0 2 0.3827 1 0.9239 -0.3827 1 0.9239
  [5,24,0,1,1,0,0,2,0.3827,1,0.9239,-0.3827,1,0.9239],
// 5 24 -0.3827 1 0.9239 -0.7654 0 1.8478 0 1 1 -0.7071 1 0.7071
  [5,24,-0.3827,1,0.9239,-0.7654,0,1.8478,0,1,1,-0.7071,1,0.7071],
// 5 24 -0.7071 1 0.7071 -1.4142 0 1.4142 -0.3827 1 0.9239 -0.9239 1 0.3827
  [5,24,-0.7071,1,0.7071,-1.4142,0,1.4142,-0.3827,1,0.9239,-0.9239,1,0.3827],
// 5 24 -0.9239 1 0.3827 -1.8478 0 0.7654 -0.7071 1 0.7071 -1 1 0
  [5,24,-0.9239,1,0.3827,-1.8478,0,0.7654,-0.7071,1,0.7071,-1,1,0],
// 5 24 -1 1 0 -2 0 0 -0.9239 1 0.3827 -0.9239 1 -0.3827
  [5,24,-1,1,0,-2,0,0,-0.9239,1,0.3827,-0.9239,1,-0.3827],
// 5 24 -0.9239 1 -0.3827 -1.8478 0 -0.7654 -1 1 0 -0.7071 1 -0.7071
  [5,24,-0.9239,1,-0.3827,-1.8478,0,-0.7654,-1,1,0,-0.7071,1,-0.7071],
// 5 24 -0.7071 1 -0.7071 -1.4142 0 -1.4142 -0.9239 1 -0.3827 -0.3827 1 -0.9239
  [5,24,-0.7071,1,-0.7071,-1.4142,0,-1.4142,-0.9239,1,-0.3827,-0.3827,1,-0.9239],
// 5 24 -0.3827 1 -0.9239 -0.7654 0 -1.8478 -0.7071 1 -0.7071 0 1 -1
  [5,24,-0.3827,1,-0.9239,-0.7654,0,-1.8478,-0.7071,1,-0.7071,0,1,-1],
// 5 24 0 1 -1 0 0 -2 -0.3827 1 -0.9239 0.3827 1 -0.9239
  [5,24,0,1,-1,0,0,-2,-0.3827,1,-0.9239,0.3827,1,-0.9239],
// 5 24 0.3827 1 -0.9239 0.7654 0 -1.8478 0 1 -1 0.7071 1 -0.7071
  [5,24,0.3827,1,-0.9239,0.7654,0,-1.8478,0,1,-1,0.7071,1,-0.7071],
// 5 24 0.7071 1 -0.7071 1.4142 0 -1.4142 0.3827 1 -0.9239 0.9239 1 -0.3827
  [5,24,0.7071,1,-0.7071,1.4142,0,-1.4142,0.3827,1,-0.9239,0.9239,1,-0.3827],
// 5 24 0.9239 1 -0.3827 1.8478 0 -0.7654 0.7071 1 -0.7071 1 1 0
  [5,24,0.9239,1,-0.3827,1.8478,0,-0.7654,0.7071,1,-0.7071,1,1,0],
// 
// 4 16 2 0 0 1 1 0 0.9239 1 0.3827 1.8478 0 0.7654
  [4,16,2,0,0,1,1,0,0.9239,1,0.3827,1.8478,0,0.7654],
// 4 16 1.8478 0 0.7654 0.9239 1 0.3827 0.7071 1 0.7071 1.4142 0 1.4142
  [4,16,1.8478,0,0.7654,0.9239,1,0.3827,0.7071,1,0.7071,1.4142,0,1.4142],
// 4 16 1.4142 0 1.4142 0.7071 1 0.7071 0.3827 1 0.9239 0.7654 0 1.8478
  [4,16,1.4142,0,1.4142,0.7071,1,0.7071,0.3827,1,0.9239,0.7654,0,1.8478],
// 4 16 0.7654 0 1.8478 0.3827 1 0.9239 0 1 1 0 0 2
  [4,16,0.7654,0,1.8478,0.3827,1,0.9239,0,1,1,0,0,2],
// 4 16 0 0 2 0 1 1 -0.3827 1 0.9239 -0.7654 0 1.8478
  [4,16,0,0,2,0,1,1,-0.3827,1,0.9239,-0.7654,0,1.8478],
// 4 16 -0.7654 0 1.8478 -0.3827 1 0.9239 -0.7071 1 0.7071 -1.4142 0 1.4142
  [4,16,-0.7654,0,1.8478,-0.3827,1,0.9239,-0.7071,1,0.7071,-1.4142,0,1.4142],
// 4 16 -1.4142 0 1.4142 -0.7071 1 0.7071 -0.9239 1 0.3827 -1.8478 0 0.7654
  [4,16,-1.4142,0,1.4142,-0.7071,1,0.7071,-0.9239,1,0.3827,-1.8478,0,0.7654],
// 4 16 -1.8478 0 0.7654 -0.9239 1 0.3827 -1 1 0 -2 0 0
  [4,16,-1.8478,0,0.7654,-0.9239,1,0.3827,-1,1,0,-2,0,0],
// 4 16 -2 0 0 -1 1 0 -0.9239 1 -0.3827 -1.8478 0 -0.7654
  [4,16,-2,0,0,-1,1,0,-0.9239,1,-0.3827,-1.8478,0,-0.7654],
// 4 16 -1.8478 0 -0.7654 -0.9239 1 -0.3827 -0.7071 1 -0.7071 -1.4142 0 -1.4142
  [4,16,-1.8478,0,-0.7654,-0.9239,1,-0.3827,-0.7071,1,-0.7071,-1.4142,0,-1.4142],
// 4 16 -1.4142 0 -1.4142 -0.7071 1 -0.7071 -0.3827 1 -0.9239 -0.7654 0 -1.8478
  [4,16,-1.4142,0,-1.4142,-0.7071,1,-0.7071,-0.3827,1,-0.9239,-0.7654,0,-1.8478],
// 4 16 -0.7654 0 -1.8478 -0.3827 1 -0.9239 0 1 -1 0 0 -2
  [4,16,-0.7654,0,-1.8478,-0.3827,1,-0.9239,0,1,-1,0,0,-2],
// 4 16 0 0 -2 0 1 -1 0.3827 1 -0.9239 0.7654 0 -1.8478
  [4,16,0,0,-2,0,1,-1,0.3827,1,-0.9239,0.7654,0,-1.8478],
// 4 16 0.7654 0 -1.8478 0.3827 1 -0.9239 0.7071 1 -0.7071 1.4142 0 -1.4142
  [4,16,0.7654,0,-1.8478,0.3827,1,-0.9239,0.7071,1,-0.7071,1.4142,0,-1.4142],
// 4 16 1.4142 0 -1.4142 0.7071 1 -0.7071 0.9239 1 -0.3827 1.8478 0 -0.7654
  [4,16,1.4142,0,-1.4142,0.7071,1,-0.7071,0.9239,1,-0.3827,1.8478,0,-0.7654],
// 4 16 1.8478 0 -0.7654 0.9239 1 -0.3827 1 1 0 2 0 0
  [4,16,1.8478,0,-0.7654,0.9239,1,-0.3827,1,1,0,2,0,0],
];
module ldraw_lib__4_4con1(step=0, col=false, unit=2/5, alt=false, line=0.2, solid=!$preview)
    makepoly(ldraw_lib__4_4con1(), step=step, col=col, unit=unit, alt=alt, line=line, solid=solid);
ldraw_lib__4_4con1(line=0.2);
// file: ../../p/4-4con0.scad
use <../lib.scad>
function ldraw_lib__4_4con0() = [
// 0 Cone  0 x 1.0
// 0 Name: 4-4con0.dat
// 0 Author: William Howard [WilliamH]
// 0 !LDRAW_ORG Primitive UPDATE 2009-03
// 0 !LICENSE Licensed under CC BY 2.0 and CC BY 4.0 : see CAreadme.txt
// 
// 0 BFC CERTIFY CCW
  [0,"BFC","CERTIFY"],
  [0,"BFC","CCW"],
// 
// 0 !HISTORY 2009-12-29 [PTadmin] Official Update 2009-03
// 
// 
// 3 16 0 1 0 0.9239 0 0.3827 1 0 0
  [3,16,0,1,0,0.9239,0,0.3827,1,0,0],
// 3 16 0 1 0 0.7071 0 0.7071 0.9239 0 0.3827
  [3,16,0,1,0,0.7071,0,0.7071,0.9239,0,0.3827],
// 3 16 0 1 0 0.3827 0 0.9239 0.7071 0 0.7071
  [3,16,0,1,0,0.3827,0,0.9239,0.7071,0,0.7071],
// 3 16 0 1 0 0 0 1 0.3827 0 0.9239
  [3,16,0,1,0,0,0,1,0.3827,0,0.9239],
// 3 16 0 1 0 -0.3827 0 0.9239 0 0 1
  [3,16,0,1,0,-0.3827,0,0.9239,0,0,1],
// 3 16 0 1 0 -0.7071 0 0.7071 -0.3827 0 0.9239
  [3,16,0,1,0,-0.7071,0,0.7071,-0.3827,0,0.9239],
// 3 16 0 1 0 -0.9239 0 0.3827 -0.7071 0 0.7071
  [3,16,0,1,0,-0.9239,0,0.3827,-0.7071,0,0.7071],
// 3 16 0 1 0 -1 0 0 -0.9239 0 0.3827
  [3,16,0,1,0,-1,0,0,-0.9239,0,0.3827],
// 3 16 0 1 0 -0.9239 0 -0.3827 -1 0 0
  [3,16,0,1,0,-0.9239,0,-0.3827,-1,0,0],
// 3 16 0 1 0 -0.7071 0 -0.7071 -0.9239 0 -0.3827
  [3,16,0,1,0,-0.7071,0,-0.7071,-0.9239,0,-0.3827],
// 3 16 0 1 0 -0.3827 0 -0.9239 -0.7071 0 -0.7071
  [3,16,0,1,0,-0.3827,0,-0.9239,-0.7071,0,-0.7071],
// 3 16 0 1 0 0 0 -1 -0.3827 0 -0.9239
  [3,16,0,1,0,0,0,-1,-0.3827,0,-0.9239],
// 3 16 0 1 0 0.3827 0 -0.9239 0 0 -1
  [3,16,0,1,0,0.3827,0,-0.9239,0,0,-1],
// 3 16 0 1 0 0.7071 0 -0.7071 0.3827 0 -0.9239
  [3,16,0,1,0,0.7071,0,-0.7071,0.3827,0,-0.9239],
// 3 16 0 1 0 0.9239 0 -0.3827 0.7071 0 -0.7071
  [3,16,0,1,0,0.9239,0,-0.3827,0.7071,0,-0.7071],
// 3 16 0 1 0 1 0 0 0.9239 0 -0.3827
  [3,16,0,1,0,1,0,0,0.9239,0,-0.3827],
// 
// 0 conditional lines
// 5 24 0 1 0 1 0 0 0.9239 0 -0.3827 0.9239 0 0.3827
  [5,24,0,1,0,1,0,0,0.9239,0,-0.3827,0.9239,0,0.3827],
// 5 24 0 1 0 0.9239 0 0.3827 1 0 0 0.7071 0 0.7071
  [5,24,0,1,0,0.9239,0,0.3827,1,0,0,0.7071,0,0.7071],
// 5 24 0 1 0 0.7071 0 0.7071 0.9239 0 0.3827 0.3827 0 0.9239
  [5,24,0,1,0,0.7071,0,0.7071,0.9239,0,0.3827,0.3827,0,0.9239],
// 5 24 0 1 0 0.3827 0 0.9239 0.7071 0 0.7071 0 0 1
  [5,24,0,1,0,0.3827,0,0.9239,0.7071,0,0.7071,0,0,1],
// 5 24 0 1 0 0 0 1 0.3827 0 0.9239 -0.3827 0 0.9239
  [5,24,0,1,0,0,0,1,0.3827,0,0.9239,-0.3827,0,0.9239],
// 5 24 0 1 0 -0.3827 0 0.9239 0 0 1 -0.7071 0 0.7071
  [5,24,0,1,0,-0.3827,0,0.9239,0,0,1,-0.7071,0,0.7071],
// 5 24 0 1 0 -0.7071 0 0.7071 -0.3827 0 0.9239 -0.9239 0 0.3827
  [5,24,0,1,0,-0.7071,0,0.7071,-0.3827,0,0.9239,-0.9239,0,0.3827],
// 5 24 0 1 0 -0.9239 0 0.3827 -0.7071 0 0.7071 -1 0 0
  [5,24,0,1,0,-0.9239,0,0.3827,-0.7071,0,0.7071,-1,0,0],
// 5 24 0 1 0 -1 0 0 -0.9239 0 0.3827 -0.9239 0 -0.3827
  [5,24,0,1,0,-1,0,0,-0.9239,0,0.3827,-0.9239,0,-0.3827],
// 5 24 0 1 0 -0.9239 0 -0.3827 -1 0 0 -0.7071 0 -0.7071
  [5,24,0,1,0,-0.9239,0,-0.3827,-1,0,0,-0.7071,0,-0.7071],
// 5 24 0 1 0 -0.7071 0 -0.7071 -0.9239 0 -0.3827 -0.3827 0 -0.9239
  [5,24,0,1,0,-0.7071,0,-0.7071,-0.9239,0,-0.3827,-0.3827,0,-0.9239],
// 5 24 0 1 0 -0.3827 0 -0.9239 -0.7071 0 -0.7071 0 0 -1
  [5,24,0,1,0,-0.3827,0,-0.9239,-0.7071,0,-0.7071,0,0,-1],
// 5 24 0 1 0 0 0 -1 -0.3827 0 -0.9239 0.3827 0 -0.9239
  [5,24,0,1,0,0,0,-1,-0.3827,0,-0.9239,0.3827,0,-0.9239],
// 5 24 0 1 0 0.3827 0 -0.9239 0 0 -1 0.7071 0 -0.7071
  [5,24,0,1,0,0.3827,0,-0.9239,0,0,-1,0.7071,0,-0.7071],
// 5 24 0 1 0 0.7071 0 -0.7071 0.3827 0 -0.9239 0.9239 0 -0.3827
  [5,24,0,1,0,0.7071,0,-0.7071,0.3827,0,-0.9239,0.9239,0,-0.3827],
// 5 24 0 1 0 0.9239 0 -0.3827 0.7071 0 -0.7071 1 0 0
  [5,24,0,1,0,0.9239,0,-0.3827,0.7071,0,-0.7071,1,0,0],
// 
// 0 end of file
];
makepoly(ldraw_lib__4_4con0(), line=0.2);
// main file
use <../../lib.scad>
use <../../p/4-4con0.scad>
use <../../p/4-4con1.scad>
use <../../p/4-4con11.scad>
use <../../p/4-4con2.scad>
use <../../p/4-4con3.scad>
use <../../p/4-4cylo.scad>
use <../../p/4-4disc.scad>
use <../../p/4-4edge.scad>
function ldraw_lib__s__23945s04() = [
// 0 ~Minifig Utensil Hourglass - Filling
// 0 Name: s\23945s04.dat
// 0 Author: Gerald Lasser [GeraldLasser]
// 0 !LDRAW_ORG Subpart UPDATE 2024-06
// 0 !LICENSE Licensed under CC BY 4.0 : see CAreadme.txt
// 
// 0 BFC CERTIFY CCW
  [0,"BFC","CERTIFY"],
  [0,"BFC","CCW"],
// 
// 0 !HISTORY 2023-02-23 {LEGO Instructions App} Original part shape
// 0 !HISTORY 2023-02-23 [GeraldLasser] File preparation for LDraw Parts Tracker
// 0 !HISTORY 2024-07-29 [OrionP] Official Update 2024-06
// 
// 
// 1 16 0 7.5 0 5.5 0 0 0 1 0 0 0 5.5 4-4disc.dat
  [1,16,0,7.5,0,5.5,0,0,0,1,0,0,0,5.5, ldraw_lib__4_4disc()],
// 1 16 0 7.5 0 0 0 -5.5 0 1 0 5.5 0 0 4-4edge.dat
  [1,16,0,7.5,0,0,0,-5.5,0,1,0,5.5,0,0, ldraw_lib__4_4edge()],
// 1 16 0 9 0 .5 0 0 0 -1.5 0 0 0 .5 4-4con11.dat
  [1,16,0,9,0,.5,0,0,0,-1.5,0,0,0,.5, ldraw_lib__4_4con11()],
// 1 16 0 9 0 6 0 0 0 -1.5 0 0 0 6 4-4edge.dat
  [1,16,0,9,0,6,0,0,0,-1.5,0,0,0,6, ldraw_lib__4_4edge()],
// 1 16 0 9 0 3 0 0 0 5 0 0 0 3 4-4con1.dat
  [1,16,0,9,0,3,0,0,0,5,0,0,0,3, ldraw_lib__4_4con1()],
// 1 16 0 14 0 3 0 0 0 7.5 0 0 0 3 4-4cylo.dat
  [1,16,0,14,0,3,0,0,0,7.5,0,0,0,3, ldraw_lib__4_4cylo()],
// 1 16 0 25.5 0 3 0 0 0 -4 0 0 0 3 4-4con1.dat
  [1,16,0,25.5,0,3,0,0,0,-4,0,0,0,3, ldraw_lib__4_4con1()],
// 1 16 0 25.5 0 6 0 0 0 6.5 0 0 0 6 4-4cylo.dat
  [1,16,0,25.5,0,6,0,0,0,6.5,0,0,0,6, ldraw_lib__4_4cylo()],
// 1 16 0 32 0 1.5 0 0 0 2 0 0 0 1.5 4-4con3.dat
  [1,16,0,32,0,1.5,0,0,0,2,0,0,0,1.5, ldraw_lib__4_4con3()],
// 1 16 0 34 0 4.5 0 0 0 1 0 0 0 4.5 4-4edge.dat
  [1,16,0,34,0,4.5,0,0,0,1,0,0,0,4.5, ldraw_lib__4_4edge()],
// 1 16 0 34 0 1.5 0 0 0 1 0 0 0 1.5 4-4con2.dat
  [1,16,0,34,0,1.5,0,0,0,1,0,0,0,1.5, ldraw_lib__4_4con2()],
// 0 BFC INVERTNEXT
  [0,"BFC","INVERTNEXT"],
// 1 16 0 35 0 3 0 0 0 -10.5 0 0 0 3 4-4cylo.dat
  [1,16,0,35,0,3,0,0,0,-10.5,0,0,0,3, ldraw_lib__4_4cylo()],
// 0 BFC INVERTNEXT
  [0,"BFC","INVERTNEXT"],
// 1 16 0 24.5 0 3 0 0 0 -4 0 0 0 3 4-4con0.dat
  [1,16,0,24.5,0,3,0,0,0,-4,0,0,0,3, ldraw_lib__4_4con0()],
];
module ldraw_lib__s__23945s04(step=0, col=false, unit=2/5, alt=false, line=0.2, solid=!$preview)
    makepoly(ldraw_lib__s__23945s04(), step=step, col=col, unit=unit, alt=alt, line=line, solid=solid);
ldraw_lib__s__23945s04(line=0.2);
